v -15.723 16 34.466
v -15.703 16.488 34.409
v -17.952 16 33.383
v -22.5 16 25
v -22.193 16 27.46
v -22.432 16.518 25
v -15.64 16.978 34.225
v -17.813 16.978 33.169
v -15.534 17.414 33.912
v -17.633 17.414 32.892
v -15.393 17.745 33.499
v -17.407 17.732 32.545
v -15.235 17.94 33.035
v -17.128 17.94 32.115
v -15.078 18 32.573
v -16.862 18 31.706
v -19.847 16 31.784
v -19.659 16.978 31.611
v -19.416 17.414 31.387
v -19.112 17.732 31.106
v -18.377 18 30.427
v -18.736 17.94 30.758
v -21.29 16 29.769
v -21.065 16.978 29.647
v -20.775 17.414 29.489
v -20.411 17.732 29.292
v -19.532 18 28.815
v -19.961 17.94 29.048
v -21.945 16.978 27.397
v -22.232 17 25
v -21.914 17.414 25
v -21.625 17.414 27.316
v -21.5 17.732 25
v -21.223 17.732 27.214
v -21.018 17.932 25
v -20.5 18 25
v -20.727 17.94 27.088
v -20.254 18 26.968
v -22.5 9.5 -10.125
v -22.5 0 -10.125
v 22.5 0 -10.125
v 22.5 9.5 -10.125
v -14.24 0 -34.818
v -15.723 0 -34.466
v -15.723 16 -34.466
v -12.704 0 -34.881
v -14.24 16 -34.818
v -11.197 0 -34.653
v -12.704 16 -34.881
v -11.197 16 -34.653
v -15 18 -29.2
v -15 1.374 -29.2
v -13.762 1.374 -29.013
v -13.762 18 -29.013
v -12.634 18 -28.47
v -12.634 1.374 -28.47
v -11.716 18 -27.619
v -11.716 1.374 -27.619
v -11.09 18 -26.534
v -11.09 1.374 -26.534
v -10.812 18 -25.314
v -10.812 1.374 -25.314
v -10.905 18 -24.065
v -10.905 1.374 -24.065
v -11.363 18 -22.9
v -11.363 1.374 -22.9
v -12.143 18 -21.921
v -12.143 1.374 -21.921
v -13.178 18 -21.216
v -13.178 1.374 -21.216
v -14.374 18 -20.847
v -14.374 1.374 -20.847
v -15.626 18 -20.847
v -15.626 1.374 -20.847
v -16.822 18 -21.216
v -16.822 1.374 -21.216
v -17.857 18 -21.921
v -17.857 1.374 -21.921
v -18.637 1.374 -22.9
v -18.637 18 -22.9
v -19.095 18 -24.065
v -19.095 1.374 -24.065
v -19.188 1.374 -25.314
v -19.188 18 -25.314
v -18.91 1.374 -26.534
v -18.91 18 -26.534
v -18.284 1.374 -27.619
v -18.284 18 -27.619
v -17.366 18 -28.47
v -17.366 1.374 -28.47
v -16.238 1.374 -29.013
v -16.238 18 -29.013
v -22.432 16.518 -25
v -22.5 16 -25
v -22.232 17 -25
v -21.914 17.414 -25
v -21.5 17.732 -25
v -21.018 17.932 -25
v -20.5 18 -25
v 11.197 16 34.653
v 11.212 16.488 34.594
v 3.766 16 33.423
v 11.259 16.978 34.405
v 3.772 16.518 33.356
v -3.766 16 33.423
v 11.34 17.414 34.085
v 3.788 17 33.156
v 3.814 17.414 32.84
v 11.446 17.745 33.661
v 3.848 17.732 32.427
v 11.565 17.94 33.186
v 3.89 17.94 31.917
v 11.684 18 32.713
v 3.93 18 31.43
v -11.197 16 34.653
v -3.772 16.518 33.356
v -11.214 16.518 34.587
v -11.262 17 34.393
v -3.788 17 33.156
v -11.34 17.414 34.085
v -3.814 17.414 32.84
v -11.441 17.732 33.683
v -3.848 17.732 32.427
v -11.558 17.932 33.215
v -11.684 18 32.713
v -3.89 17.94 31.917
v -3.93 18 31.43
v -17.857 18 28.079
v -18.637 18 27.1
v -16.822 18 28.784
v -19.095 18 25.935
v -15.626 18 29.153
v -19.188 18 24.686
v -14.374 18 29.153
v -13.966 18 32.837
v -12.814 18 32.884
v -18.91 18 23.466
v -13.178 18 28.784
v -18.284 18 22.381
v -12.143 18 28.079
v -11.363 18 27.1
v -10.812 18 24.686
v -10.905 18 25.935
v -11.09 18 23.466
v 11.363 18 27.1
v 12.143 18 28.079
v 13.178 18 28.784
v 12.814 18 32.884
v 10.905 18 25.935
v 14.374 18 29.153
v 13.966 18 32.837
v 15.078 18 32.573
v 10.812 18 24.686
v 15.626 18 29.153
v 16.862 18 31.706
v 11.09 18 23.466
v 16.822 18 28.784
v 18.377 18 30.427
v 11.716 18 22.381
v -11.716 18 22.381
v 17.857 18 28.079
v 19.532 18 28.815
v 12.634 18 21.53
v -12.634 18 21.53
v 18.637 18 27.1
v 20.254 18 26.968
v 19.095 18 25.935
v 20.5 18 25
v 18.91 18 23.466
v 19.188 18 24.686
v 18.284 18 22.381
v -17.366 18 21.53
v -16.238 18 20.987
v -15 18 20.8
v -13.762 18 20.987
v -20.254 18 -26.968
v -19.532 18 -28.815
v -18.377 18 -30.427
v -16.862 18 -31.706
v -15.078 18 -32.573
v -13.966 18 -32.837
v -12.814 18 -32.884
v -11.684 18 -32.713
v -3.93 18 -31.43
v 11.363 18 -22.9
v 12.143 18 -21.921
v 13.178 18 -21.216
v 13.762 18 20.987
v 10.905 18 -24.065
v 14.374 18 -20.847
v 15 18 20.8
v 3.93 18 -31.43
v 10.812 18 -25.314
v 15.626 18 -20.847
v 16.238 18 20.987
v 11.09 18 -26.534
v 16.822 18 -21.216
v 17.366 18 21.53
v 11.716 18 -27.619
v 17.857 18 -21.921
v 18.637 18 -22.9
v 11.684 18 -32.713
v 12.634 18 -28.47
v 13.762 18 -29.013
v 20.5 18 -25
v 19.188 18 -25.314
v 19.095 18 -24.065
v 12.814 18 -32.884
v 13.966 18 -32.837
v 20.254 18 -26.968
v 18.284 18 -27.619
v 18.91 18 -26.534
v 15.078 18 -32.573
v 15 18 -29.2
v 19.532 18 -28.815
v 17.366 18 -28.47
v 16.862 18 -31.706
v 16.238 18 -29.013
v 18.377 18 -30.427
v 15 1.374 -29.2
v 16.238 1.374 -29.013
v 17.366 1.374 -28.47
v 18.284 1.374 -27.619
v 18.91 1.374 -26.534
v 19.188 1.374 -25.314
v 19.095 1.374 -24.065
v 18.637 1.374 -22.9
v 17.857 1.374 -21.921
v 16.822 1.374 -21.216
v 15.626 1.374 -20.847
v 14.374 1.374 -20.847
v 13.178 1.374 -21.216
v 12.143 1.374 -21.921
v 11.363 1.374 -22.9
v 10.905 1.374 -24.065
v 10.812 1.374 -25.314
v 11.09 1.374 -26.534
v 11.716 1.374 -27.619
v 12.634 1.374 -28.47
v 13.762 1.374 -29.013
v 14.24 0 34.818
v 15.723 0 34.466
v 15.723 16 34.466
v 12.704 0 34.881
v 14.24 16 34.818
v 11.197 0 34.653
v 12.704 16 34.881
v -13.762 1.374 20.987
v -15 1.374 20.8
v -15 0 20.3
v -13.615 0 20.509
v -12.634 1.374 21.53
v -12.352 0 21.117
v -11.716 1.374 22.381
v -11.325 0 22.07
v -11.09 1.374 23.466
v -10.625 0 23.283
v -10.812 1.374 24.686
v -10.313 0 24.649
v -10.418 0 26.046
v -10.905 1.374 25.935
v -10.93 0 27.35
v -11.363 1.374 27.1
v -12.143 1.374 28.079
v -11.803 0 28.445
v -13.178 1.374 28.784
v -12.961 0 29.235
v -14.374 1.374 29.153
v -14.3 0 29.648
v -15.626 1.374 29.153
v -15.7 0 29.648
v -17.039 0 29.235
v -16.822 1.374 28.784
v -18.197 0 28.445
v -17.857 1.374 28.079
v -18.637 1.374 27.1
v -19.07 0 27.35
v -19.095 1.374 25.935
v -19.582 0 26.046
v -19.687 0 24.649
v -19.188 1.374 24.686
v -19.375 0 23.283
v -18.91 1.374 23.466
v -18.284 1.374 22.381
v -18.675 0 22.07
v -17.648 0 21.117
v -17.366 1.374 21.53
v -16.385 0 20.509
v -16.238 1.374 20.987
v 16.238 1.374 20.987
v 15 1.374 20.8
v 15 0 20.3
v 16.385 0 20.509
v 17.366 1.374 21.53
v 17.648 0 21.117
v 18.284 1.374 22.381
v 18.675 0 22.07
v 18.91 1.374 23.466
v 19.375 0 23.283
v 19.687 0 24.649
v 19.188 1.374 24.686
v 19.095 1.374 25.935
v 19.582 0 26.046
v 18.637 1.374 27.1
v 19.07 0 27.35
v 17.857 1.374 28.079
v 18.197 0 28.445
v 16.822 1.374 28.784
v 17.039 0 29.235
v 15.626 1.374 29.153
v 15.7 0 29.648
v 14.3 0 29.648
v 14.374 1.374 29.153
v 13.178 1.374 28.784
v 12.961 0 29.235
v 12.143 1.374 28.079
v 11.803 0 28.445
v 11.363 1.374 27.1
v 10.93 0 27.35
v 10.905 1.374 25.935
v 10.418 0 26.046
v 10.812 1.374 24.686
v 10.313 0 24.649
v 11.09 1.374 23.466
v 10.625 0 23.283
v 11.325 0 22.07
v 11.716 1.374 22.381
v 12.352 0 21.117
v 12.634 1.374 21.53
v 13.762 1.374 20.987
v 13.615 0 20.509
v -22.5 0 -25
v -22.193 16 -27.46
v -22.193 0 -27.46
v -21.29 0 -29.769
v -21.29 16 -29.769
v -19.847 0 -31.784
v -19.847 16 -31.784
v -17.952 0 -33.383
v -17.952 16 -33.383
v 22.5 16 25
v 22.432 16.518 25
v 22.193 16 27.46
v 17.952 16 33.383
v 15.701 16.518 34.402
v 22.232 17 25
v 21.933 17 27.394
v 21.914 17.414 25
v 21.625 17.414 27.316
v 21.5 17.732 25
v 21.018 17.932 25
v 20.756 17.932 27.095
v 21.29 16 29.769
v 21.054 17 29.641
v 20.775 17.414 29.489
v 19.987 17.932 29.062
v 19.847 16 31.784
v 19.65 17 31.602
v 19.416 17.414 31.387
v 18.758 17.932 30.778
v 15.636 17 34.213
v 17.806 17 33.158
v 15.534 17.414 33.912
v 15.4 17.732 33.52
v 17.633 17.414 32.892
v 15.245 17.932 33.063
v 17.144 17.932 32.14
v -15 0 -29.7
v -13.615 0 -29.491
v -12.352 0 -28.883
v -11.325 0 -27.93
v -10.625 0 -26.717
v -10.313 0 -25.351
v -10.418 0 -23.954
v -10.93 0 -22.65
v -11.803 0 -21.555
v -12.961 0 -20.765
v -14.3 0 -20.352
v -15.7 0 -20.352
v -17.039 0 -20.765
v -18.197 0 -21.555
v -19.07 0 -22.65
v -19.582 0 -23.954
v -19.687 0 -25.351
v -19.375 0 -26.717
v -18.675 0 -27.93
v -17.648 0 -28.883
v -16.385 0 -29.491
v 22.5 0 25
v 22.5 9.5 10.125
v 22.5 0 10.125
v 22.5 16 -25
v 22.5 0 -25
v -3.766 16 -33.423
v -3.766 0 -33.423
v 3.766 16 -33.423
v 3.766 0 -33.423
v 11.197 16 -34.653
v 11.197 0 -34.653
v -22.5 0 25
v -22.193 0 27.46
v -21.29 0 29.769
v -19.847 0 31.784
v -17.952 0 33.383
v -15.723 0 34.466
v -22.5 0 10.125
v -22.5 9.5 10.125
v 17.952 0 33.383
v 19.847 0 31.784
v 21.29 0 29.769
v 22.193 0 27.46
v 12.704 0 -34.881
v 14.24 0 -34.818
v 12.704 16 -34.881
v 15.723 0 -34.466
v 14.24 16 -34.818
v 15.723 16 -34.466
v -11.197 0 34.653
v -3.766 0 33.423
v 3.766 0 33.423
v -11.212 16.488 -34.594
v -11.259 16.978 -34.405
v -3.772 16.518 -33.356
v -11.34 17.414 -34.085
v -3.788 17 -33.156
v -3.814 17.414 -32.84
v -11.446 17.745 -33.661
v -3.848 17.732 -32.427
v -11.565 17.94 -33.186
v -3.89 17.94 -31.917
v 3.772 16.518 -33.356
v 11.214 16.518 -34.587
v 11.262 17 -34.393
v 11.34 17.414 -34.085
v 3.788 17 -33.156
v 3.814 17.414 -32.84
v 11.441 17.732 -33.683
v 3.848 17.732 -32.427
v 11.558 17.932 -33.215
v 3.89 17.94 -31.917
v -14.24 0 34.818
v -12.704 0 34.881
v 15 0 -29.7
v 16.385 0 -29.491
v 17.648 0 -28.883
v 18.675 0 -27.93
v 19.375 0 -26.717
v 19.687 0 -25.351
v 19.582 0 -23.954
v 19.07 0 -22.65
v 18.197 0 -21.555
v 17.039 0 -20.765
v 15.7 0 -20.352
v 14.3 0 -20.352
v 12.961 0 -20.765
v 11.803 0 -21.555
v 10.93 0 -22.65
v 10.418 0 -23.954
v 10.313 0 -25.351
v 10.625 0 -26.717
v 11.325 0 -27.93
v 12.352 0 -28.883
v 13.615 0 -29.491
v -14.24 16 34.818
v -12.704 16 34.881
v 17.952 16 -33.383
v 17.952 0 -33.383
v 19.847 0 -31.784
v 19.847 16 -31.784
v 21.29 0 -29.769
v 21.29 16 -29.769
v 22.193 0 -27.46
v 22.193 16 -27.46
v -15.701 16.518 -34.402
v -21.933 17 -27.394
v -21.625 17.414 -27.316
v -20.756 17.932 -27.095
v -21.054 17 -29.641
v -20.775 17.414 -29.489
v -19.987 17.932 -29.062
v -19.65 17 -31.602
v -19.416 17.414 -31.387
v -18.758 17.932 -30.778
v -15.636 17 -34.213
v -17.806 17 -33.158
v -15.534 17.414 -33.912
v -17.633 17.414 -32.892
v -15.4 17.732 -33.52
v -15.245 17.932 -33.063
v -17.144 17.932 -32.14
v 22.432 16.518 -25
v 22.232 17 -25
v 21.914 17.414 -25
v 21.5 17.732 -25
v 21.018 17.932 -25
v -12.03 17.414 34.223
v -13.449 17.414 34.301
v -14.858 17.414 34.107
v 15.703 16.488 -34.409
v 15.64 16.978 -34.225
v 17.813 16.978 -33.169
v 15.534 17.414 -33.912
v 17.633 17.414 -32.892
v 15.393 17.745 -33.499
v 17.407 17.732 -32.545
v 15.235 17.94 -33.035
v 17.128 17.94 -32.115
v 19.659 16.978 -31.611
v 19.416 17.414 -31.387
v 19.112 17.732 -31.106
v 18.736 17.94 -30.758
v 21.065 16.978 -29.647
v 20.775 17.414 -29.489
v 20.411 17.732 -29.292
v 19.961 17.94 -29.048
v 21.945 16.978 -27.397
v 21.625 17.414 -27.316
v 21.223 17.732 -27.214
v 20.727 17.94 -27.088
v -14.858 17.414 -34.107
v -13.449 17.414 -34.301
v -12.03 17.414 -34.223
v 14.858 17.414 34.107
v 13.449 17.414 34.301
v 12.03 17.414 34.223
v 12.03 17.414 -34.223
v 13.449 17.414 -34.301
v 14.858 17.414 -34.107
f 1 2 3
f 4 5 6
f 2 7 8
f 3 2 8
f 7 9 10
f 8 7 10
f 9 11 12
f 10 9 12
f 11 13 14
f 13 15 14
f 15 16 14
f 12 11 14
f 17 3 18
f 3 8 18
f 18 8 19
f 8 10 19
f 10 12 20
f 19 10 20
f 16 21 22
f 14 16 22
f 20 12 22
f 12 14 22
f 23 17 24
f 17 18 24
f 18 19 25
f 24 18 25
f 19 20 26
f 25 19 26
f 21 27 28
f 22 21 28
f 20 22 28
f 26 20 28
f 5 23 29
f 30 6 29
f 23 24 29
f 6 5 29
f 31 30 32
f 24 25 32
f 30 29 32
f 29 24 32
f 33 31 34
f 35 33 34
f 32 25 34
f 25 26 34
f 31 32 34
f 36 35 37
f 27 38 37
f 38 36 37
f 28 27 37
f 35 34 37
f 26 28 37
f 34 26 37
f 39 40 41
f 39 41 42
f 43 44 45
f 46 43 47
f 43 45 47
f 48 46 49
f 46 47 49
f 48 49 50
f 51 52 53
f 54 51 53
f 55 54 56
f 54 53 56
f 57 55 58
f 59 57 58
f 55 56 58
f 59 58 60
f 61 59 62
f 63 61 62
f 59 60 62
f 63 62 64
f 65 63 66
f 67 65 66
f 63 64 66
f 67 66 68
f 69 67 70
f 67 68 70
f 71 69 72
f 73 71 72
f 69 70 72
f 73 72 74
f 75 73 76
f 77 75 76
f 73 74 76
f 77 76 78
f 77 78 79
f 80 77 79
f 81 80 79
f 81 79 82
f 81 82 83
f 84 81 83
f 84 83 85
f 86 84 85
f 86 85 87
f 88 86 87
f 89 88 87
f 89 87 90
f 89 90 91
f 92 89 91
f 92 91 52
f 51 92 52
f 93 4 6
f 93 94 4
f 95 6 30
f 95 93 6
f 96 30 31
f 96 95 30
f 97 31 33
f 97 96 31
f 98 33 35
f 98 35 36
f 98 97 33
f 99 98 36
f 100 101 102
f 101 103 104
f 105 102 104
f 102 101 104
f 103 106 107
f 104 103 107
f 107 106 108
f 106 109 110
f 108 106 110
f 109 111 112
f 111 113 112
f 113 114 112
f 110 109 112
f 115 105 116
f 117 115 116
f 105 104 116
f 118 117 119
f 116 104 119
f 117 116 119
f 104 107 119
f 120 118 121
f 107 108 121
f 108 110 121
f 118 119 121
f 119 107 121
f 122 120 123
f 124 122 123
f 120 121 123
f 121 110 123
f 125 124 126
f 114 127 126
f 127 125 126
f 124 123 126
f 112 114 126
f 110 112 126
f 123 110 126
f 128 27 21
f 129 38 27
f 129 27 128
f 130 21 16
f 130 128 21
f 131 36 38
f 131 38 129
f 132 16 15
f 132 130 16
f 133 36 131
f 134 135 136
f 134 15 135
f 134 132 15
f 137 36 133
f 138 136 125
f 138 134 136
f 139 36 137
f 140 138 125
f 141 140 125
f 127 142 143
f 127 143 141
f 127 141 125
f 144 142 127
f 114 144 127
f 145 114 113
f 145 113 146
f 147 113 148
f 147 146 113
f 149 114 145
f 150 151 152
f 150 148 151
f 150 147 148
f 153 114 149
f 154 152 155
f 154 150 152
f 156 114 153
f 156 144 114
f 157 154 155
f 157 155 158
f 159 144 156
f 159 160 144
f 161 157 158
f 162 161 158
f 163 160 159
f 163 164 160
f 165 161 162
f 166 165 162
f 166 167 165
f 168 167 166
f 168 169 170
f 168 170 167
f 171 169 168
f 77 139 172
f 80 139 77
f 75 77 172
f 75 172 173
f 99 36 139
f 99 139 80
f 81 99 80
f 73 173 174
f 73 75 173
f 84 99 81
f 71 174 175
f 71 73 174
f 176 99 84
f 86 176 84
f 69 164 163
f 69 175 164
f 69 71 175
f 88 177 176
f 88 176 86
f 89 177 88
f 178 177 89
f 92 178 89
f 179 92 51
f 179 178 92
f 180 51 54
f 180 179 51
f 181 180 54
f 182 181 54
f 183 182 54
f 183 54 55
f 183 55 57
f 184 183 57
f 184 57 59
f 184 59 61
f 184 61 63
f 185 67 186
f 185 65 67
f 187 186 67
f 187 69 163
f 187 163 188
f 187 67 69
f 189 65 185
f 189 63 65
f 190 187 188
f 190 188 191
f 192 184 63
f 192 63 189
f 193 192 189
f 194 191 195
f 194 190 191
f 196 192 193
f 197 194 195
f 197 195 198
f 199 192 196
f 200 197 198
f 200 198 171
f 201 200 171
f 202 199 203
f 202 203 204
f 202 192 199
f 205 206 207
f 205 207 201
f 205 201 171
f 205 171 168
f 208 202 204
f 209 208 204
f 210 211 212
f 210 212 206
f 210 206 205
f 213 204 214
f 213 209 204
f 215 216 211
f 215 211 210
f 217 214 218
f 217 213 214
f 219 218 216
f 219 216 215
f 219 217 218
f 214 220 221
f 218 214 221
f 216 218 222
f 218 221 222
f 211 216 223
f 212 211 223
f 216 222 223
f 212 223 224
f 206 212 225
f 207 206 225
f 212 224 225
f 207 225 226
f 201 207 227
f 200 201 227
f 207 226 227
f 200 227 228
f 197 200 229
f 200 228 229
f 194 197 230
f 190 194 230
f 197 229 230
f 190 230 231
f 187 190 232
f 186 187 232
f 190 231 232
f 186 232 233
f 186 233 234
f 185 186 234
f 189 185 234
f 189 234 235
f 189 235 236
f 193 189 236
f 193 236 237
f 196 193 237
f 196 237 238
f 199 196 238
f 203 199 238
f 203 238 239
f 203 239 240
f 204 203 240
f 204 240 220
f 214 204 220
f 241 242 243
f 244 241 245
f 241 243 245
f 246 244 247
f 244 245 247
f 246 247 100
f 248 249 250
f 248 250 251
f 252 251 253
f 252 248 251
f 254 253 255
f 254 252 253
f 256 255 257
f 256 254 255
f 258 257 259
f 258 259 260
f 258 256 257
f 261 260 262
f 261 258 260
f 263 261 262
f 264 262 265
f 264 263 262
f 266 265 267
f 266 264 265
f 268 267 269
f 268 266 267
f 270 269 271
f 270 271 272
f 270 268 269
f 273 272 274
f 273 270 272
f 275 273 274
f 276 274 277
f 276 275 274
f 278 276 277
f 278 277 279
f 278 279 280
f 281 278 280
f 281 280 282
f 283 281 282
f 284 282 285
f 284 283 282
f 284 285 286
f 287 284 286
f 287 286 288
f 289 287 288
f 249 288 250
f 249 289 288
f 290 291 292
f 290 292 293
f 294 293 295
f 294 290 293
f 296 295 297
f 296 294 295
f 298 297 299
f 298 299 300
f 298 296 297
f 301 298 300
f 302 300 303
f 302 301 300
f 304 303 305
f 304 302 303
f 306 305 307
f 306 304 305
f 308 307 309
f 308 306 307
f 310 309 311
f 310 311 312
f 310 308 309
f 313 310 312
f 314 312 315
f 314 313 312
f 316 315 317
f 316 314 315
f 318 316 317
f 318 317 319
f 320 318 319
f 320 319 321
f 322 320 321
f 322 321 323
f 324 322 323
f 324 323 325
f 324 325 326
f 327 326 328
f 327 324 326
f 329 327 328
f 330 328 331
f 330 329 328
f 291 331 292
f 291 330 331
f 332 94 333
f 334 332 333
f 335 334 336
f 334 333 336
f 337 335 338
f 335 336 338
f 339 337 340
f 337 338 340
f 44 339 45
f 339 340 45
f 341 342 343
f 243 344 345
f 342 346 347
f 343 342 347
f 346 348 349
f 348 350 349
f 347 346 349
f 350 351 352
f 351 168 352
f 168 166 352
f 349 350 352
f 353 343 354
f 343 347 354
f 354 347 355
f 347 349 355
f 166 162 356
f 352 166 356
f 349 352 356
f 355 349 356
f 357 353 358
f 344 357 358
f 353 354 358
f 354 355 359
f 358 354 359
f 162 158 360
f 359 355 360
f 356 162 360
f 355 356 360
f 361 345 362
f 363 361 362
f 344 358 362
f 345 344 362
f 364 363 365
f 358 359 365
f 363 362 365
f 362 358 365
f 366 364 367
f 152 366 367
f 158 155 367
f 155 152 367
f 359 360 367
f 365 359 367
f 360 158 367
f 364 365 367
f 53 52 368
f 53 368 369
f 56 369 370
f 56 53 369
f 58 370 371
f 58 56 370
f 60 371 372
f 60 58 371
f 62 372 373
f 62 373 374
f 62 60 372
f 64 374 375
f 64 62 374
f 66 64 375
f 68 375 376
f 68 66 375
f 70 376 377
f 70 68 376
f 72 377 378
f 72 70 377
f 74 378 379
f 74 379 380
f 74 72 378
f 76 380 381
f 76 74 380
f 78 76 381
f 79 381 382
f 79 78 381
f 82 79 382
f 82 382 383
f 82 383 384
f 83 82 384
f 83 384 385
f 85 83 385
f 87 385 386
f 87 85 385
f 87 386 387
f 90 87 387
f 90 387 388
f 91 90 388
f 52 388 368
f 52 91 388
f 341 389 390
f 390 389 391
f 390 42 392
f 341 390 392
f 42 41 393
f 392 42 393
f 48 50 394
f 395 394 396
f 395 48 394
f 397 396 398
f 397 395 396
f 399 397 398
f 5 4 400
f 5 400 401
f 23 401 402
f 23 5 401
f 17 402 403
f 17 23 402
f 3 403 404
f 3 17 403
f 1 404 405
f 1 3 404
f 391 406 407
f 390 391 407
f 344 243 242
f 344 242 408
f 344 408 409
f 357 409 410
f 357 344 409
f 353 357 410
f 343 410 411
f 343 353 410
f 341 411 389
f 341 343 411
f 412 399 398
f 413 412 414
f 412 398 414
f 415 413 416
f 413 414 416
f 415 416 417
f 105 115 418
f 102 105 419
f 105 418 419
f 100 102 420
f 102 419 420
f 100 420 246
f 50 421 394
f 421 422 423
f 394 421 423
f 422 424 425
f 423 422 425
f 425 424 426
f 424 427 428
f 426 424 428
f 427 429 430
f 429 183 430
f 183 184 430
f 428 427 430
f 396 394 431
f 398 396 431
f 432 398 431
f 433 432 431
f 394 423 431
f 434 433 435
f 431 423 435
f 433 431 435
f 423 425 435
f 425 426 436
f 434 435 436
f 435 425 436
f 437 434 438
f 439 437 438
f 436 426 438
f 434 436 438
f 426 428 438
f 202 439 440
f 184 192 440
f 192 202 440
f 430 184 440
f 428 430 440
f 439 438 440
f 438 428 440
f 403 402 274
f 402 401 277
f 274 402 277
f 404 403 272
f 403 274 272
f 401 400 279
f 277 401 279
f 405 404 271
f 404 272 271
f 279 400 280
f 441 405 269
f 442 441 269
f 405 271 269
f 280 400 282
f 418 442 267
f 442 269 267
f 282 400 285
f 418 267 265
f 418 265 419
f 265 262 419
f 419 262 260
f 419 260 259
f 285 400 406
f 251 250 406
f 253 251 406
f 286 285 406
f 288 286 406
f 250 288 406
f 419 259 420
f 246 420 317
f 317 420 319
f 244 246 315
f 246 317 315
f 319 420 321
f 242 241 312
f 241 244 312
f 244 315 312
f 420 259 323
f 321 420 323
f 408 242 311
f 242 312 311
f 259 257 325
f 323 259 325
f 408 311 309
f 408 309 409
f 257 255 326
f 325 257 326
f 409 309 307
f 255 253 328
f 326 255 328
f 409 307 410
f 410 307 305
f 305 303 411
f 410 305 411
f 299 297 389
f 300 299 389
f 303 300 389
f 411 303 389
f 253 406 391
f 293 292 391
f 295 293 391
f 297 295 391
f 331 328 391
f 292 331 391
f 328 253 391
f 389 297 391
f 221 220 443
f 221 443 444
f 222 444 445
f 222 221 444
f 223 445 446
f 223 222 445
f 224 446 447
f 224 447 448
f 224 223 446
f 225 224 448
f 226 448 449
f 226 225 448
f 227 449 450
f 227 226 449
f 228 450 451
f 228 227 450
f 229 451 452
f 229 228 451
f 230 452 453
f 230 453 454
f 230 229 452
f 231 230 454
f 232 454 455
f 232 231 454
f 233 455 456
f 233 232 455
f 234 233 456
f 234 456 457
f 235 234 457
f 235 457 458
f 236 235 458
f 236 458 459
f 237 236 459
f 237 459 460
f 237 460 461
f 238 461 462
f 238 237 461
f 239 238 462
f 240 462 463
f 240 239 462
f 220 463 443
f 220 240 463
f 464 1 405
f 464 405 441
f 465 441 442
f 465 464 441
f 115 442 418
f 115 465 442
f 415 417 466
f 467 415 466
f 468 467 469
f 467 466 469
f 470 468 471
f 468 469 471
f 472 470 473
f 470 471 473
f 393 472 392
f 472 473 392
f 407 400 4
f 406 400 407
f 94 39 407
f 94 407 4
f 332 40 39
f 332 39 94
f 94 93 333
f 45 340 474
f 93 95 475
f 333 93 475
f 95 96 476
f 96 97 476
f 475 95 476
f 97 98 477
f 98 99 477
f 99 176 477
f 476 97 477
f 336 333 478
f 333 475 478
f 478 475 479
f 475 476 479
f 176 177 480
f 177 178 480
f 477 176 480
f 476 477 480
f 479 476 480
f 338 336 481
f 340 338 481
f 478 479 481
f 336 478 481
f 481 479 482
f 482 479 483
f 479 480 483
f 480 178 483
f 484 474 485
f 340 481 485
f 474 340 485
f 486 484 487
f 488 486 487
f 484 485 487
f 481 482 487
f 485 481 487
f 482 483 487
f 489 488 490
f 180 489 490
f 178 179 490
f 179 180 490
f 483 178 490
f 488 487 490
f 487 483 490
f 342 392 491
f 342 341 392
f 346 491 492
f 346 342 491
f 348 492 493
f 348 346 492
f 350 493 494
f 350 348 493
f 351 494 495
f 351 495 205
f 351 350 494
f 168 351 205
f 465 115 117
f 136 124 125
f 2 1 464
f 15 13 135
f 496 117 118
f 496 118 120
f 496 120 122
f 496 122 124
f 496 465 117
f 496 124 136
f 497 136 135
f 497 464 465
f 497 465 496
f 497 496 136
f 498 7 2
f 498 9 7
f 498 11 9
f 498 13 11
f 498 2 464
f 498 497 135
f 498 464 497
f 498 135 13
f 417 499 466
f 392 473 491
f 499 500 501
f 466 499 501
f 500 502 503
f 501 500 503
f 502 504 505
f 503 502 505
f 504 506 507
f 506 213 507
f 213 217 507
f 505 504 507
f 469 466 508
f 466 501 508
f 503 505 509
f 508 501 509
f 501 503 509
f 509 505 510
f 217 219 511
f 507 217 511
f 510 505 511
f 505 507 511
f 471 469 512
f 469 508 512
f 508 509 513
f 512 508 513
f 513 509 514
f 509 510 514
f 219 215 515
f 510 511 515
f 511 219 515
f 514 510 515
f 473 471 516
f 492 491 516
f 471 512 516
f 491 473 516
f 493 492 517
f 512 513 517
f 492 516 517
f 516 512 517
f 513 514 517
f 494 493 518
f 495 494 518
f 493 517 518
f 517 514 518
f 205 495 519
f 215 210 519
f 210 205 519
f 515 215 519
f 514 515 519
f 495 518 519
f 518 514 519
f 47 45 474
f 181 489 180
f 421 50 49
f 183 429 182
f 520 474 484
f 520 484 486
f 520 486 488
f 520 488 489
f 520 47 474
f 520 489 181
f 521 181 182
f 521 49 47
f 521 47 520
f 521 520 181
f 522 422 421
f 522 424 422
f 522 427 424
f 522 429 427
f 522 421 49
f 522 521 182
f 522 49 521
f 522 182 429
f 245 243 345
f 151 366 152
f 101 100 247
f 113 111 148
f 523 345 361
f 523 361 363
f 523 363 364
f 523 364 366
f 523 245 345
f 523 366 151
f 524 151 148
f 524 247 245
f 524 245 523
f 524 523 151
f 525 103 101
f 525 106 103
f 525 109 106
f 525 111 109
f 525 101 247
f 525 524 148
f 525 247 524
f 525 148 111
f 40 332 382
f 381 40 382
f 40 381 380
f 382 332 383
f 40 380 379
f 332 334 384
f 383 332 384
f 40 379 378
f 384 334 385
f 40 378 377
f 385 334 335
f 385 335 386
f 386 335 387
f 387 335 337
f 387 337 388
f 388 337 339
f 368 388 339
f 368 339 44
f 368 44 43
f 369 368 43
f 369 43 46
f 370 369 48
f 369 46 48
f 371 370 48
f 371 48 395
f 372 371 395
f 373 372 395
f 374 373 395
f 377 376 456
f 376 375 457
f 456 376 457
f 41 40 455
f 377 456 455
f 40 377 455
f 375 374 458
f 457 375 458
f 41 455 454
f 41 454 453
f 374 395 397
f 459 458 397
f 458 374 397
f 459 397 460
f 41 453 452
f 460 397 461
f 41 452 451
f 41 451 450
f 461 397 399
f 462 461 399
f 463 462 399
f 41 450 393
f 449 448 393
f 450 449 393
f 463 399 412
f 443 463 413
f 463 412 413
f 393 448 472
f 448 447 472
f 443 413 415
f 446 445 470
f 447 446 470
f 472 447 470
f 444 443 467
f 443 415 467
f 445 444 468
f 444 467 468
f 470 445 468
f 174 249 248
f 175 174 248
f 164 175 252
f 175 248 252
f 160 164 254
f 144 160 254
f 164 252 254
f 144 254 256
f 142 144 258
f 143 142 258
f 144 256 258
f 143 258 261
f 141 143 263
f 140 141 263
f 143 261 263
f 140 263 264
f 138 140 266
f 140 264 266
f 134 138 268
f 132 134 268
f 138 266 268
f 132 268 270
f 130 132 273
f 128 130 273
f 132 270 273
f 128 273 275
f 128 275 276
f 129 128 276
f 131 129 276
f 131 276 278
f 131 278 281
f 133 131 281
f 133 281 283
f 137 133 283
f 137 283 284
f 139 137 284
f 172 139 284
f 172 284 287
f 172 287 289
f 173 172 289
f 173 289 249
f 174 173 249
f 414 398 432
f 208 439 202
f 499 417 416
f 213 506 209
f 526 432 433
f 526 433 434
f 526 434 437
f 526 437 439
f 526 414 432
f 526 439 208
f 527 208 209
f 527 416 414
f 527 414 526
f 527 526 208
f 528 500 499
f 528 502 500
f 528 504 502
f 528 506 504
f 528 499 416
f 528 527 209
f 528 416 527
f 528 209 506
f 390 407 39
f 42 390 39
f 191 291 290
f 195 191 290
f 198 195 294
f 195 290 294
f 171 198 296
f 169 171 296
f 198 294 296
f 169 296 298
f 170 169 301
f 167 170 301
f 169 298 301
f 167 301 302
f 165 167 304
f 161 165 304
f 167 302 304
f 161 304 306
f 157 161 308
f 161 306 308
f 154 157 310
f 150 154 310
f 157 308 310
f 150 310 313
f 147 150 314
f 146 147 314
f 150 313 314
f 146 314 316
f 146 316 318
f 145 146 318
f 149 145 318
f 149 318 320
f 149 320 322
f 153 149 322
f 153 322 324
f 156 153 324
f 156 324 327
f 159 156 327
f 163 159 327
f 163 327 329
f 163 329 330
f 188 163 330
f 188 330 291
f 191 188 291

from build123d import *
from OCP.BRepFilletAPI import BRepFilletAPI_MakeChamfer

# Parameters (mm, degrees)
SKETCH1_W               = 45
SKETCH1_H               = 70
BOSS_EXTRUDE1_DEPTH     = 18
CUT_EXTRUDE1_DEPTH      = 60.782940711
CUT_EXTRUDE1_DEPTH_BACK = 60.782940711
SKETCH2_W               = 20.25
SKETCH2_H               = 9.5
SKETCH3_R               = 4.2
CUT_EXTRUDE2_DEPTH      = 46.33486517
FILLET1_R               = 10
CUT_EXTRUDE3_DEPTH      = 46.33486517
FILLET2_R               = 8
FILLET4_R               = 2
CHAMFER1_SIZE           = 0.5
CHAMFER1_SIZE2          = 1.37373871


with BuildPart() as part:
    # Sketch1 → Boss-Extrude1 (new body)
    with BuildSketch(Plane(origin=(0, 0, 0), x_dir=(1, 0, 0), z_dir=(0, 1, 0))):
        Rectangle(SKETCH1_W, SKETCH1_H)
    extrude(amount=BOSS_EXTRUDE1_DEPTH)

    # Sketch2 → Cut-Extrude1 (cut, two sides: drawn at the far end of the back side and taken through both)
    with BuildSketch(Plane(origin=(22.5, 0, 0), x_dir=(0, 0, -1), z_dir=(1, 0, 0)).offset(-CUT_EXTRUDE1_DEPTH_BACK)):
        with Locations((0, 4.75)):
            Rectangle(SKETCH2_W, SKETCH2_H)
    extrude(amount=CUT_EXTRUDE1_DEPTH + CUT_EXTRUDE1_DEPTH_BACK, mode=Mode.SUBTRACT)

    # Sketch3 → Cut-Extrude2 (cut, through all)
    with BuildSketch(Plane.XZ):
        with Locations(Location((15, 25, 0), (0, 0, 270))):
            Circle(SKETCH3_R)
        with Locations(Location((15, -25, 0), (0, 0, 270))):
            Circle(SKETCH3_R)
        with Locations(Location((-15, -25, 0), (0, 0, 270))):
            Circle(SKETCH3_R)
        with Locations(Location((-15, 25, 0), (0, 0, 270))):
            Circle(SKETCH3_R)
    extrude(amount=-CUT_EXTRUDE2_DEPTH, mode=Mode.SUBTRACT)

    # Fillet1
    fillet1_edges = [part.edges().sort_by_distance(p)[0] for p in [
        (-22.5, 9, -35),
        (22.5, 9, -35),
        (22.5, 9, 35),
        (-22.5, 9, 35),
    ]]
    fillet(fillet1_edges, radius=FILLET1_R)

    # Sketch6 → Cut-Extrude3 (cut, through all)
    with BuildSketch(Plane.XZ):
        with BuildLine():
            Line((12.5, 35), (-12.5, 35))
            ThreePointArc((-12.5, 35), (0, 33.26906369), (12.5, 35))
        make_face()
        with BuildLine():
            Line((12.5, -35), (-12.5, -35))
            ThreePointArc((-12.5, -35), (0, -33.26906369), (12.5, -35))
        make_face()
    extrude(amount=-CUT_EXTRUDE3_DEPTH, mode=Mode.SUBTRACT)

    # Fillet2
    fillet2_edges = [part.edges().sort_by_distance(p)[0] for p in [
        (12.5, 9, 35),
        (-12.5, 9, 35),
        (12.5, 9, -35),
        (-12.5, 9, -35),
    ]]
    fillet(fillet2_edges, radius=FILLET2_R)

    # Fillet4
    fillet4_edges = [part.edges().sort_by_distance(p)[0] for p in [
        (-22.5, 18, 0),
        (22.5, 18, 0),
        (20.63102045, 18, -30.821211768),
        (-20.63102045, 18, 30.821211768),
        (0, 18, 33.26906369),
        (20.63102045, 18, 30.821211768),
        (0, 18, -33.26906369),
        (-20.63102045, 18, -30.821211768),
        (13.473401565, 18, -34.886533438),
        (-13.473401565, 18, -34.886533438),
        (-13.473401565, 18, 34.886533438),
        (13.473401565, 18, 34.886533438),
    ]]
    fillet(fillet4_edges, radius=FILLET4_R)

    # Chamfer1: one chamfer whose edges measure the first distance from different faces: ONE call of the kernel's chamfer builder (chamfer() names one face for all edges)
    chamfer1_edges_1 = [part.edges().sort_by_distance(p)[0] for p in [
        (-15, 0, -20.8),
        (15, 0, -20.8),
    ]]
    chamfer1_side_1 = [part.faces().sort_by_distance(p)[0] for p in [
        (0, 0, -21.437561791),
    ]]
    chamfer1_edges_2 = [part.edges().sort_by_distance(p)[0] for p in [
        (-15, 0, 29.2),
        (15, 0, 29.2),
    ]]
    chamfer1_side_2 = [part.faces().sort_by_distance(p)[0] for p in [
        (0, 0, 21.437561791),
    ]]
    chamfer1 = BRepFilletAPI_MakeChamfer(part.part.solid().wrapped)
    for e in chamfer1_edges_1:
        chamfer1.Add(CHAMFER1_SIZE, CHAMFER1_SIZE2, e.wrapped, chamfer1_side_1[0].wrapped)  # the first distance lies on this face
    for e in chamfer1_edges_2:
        chamfer1.Add(CHAMFER1_SIZE, CHAMFER1_SIZE2, e.wrapped, chamfer1_side_2[0].wrapped)  # the first distance lies on this face
    add(Compound.cast(chamfer1.Shape()), mode=Mode.REPLACE)


solid = part.part
